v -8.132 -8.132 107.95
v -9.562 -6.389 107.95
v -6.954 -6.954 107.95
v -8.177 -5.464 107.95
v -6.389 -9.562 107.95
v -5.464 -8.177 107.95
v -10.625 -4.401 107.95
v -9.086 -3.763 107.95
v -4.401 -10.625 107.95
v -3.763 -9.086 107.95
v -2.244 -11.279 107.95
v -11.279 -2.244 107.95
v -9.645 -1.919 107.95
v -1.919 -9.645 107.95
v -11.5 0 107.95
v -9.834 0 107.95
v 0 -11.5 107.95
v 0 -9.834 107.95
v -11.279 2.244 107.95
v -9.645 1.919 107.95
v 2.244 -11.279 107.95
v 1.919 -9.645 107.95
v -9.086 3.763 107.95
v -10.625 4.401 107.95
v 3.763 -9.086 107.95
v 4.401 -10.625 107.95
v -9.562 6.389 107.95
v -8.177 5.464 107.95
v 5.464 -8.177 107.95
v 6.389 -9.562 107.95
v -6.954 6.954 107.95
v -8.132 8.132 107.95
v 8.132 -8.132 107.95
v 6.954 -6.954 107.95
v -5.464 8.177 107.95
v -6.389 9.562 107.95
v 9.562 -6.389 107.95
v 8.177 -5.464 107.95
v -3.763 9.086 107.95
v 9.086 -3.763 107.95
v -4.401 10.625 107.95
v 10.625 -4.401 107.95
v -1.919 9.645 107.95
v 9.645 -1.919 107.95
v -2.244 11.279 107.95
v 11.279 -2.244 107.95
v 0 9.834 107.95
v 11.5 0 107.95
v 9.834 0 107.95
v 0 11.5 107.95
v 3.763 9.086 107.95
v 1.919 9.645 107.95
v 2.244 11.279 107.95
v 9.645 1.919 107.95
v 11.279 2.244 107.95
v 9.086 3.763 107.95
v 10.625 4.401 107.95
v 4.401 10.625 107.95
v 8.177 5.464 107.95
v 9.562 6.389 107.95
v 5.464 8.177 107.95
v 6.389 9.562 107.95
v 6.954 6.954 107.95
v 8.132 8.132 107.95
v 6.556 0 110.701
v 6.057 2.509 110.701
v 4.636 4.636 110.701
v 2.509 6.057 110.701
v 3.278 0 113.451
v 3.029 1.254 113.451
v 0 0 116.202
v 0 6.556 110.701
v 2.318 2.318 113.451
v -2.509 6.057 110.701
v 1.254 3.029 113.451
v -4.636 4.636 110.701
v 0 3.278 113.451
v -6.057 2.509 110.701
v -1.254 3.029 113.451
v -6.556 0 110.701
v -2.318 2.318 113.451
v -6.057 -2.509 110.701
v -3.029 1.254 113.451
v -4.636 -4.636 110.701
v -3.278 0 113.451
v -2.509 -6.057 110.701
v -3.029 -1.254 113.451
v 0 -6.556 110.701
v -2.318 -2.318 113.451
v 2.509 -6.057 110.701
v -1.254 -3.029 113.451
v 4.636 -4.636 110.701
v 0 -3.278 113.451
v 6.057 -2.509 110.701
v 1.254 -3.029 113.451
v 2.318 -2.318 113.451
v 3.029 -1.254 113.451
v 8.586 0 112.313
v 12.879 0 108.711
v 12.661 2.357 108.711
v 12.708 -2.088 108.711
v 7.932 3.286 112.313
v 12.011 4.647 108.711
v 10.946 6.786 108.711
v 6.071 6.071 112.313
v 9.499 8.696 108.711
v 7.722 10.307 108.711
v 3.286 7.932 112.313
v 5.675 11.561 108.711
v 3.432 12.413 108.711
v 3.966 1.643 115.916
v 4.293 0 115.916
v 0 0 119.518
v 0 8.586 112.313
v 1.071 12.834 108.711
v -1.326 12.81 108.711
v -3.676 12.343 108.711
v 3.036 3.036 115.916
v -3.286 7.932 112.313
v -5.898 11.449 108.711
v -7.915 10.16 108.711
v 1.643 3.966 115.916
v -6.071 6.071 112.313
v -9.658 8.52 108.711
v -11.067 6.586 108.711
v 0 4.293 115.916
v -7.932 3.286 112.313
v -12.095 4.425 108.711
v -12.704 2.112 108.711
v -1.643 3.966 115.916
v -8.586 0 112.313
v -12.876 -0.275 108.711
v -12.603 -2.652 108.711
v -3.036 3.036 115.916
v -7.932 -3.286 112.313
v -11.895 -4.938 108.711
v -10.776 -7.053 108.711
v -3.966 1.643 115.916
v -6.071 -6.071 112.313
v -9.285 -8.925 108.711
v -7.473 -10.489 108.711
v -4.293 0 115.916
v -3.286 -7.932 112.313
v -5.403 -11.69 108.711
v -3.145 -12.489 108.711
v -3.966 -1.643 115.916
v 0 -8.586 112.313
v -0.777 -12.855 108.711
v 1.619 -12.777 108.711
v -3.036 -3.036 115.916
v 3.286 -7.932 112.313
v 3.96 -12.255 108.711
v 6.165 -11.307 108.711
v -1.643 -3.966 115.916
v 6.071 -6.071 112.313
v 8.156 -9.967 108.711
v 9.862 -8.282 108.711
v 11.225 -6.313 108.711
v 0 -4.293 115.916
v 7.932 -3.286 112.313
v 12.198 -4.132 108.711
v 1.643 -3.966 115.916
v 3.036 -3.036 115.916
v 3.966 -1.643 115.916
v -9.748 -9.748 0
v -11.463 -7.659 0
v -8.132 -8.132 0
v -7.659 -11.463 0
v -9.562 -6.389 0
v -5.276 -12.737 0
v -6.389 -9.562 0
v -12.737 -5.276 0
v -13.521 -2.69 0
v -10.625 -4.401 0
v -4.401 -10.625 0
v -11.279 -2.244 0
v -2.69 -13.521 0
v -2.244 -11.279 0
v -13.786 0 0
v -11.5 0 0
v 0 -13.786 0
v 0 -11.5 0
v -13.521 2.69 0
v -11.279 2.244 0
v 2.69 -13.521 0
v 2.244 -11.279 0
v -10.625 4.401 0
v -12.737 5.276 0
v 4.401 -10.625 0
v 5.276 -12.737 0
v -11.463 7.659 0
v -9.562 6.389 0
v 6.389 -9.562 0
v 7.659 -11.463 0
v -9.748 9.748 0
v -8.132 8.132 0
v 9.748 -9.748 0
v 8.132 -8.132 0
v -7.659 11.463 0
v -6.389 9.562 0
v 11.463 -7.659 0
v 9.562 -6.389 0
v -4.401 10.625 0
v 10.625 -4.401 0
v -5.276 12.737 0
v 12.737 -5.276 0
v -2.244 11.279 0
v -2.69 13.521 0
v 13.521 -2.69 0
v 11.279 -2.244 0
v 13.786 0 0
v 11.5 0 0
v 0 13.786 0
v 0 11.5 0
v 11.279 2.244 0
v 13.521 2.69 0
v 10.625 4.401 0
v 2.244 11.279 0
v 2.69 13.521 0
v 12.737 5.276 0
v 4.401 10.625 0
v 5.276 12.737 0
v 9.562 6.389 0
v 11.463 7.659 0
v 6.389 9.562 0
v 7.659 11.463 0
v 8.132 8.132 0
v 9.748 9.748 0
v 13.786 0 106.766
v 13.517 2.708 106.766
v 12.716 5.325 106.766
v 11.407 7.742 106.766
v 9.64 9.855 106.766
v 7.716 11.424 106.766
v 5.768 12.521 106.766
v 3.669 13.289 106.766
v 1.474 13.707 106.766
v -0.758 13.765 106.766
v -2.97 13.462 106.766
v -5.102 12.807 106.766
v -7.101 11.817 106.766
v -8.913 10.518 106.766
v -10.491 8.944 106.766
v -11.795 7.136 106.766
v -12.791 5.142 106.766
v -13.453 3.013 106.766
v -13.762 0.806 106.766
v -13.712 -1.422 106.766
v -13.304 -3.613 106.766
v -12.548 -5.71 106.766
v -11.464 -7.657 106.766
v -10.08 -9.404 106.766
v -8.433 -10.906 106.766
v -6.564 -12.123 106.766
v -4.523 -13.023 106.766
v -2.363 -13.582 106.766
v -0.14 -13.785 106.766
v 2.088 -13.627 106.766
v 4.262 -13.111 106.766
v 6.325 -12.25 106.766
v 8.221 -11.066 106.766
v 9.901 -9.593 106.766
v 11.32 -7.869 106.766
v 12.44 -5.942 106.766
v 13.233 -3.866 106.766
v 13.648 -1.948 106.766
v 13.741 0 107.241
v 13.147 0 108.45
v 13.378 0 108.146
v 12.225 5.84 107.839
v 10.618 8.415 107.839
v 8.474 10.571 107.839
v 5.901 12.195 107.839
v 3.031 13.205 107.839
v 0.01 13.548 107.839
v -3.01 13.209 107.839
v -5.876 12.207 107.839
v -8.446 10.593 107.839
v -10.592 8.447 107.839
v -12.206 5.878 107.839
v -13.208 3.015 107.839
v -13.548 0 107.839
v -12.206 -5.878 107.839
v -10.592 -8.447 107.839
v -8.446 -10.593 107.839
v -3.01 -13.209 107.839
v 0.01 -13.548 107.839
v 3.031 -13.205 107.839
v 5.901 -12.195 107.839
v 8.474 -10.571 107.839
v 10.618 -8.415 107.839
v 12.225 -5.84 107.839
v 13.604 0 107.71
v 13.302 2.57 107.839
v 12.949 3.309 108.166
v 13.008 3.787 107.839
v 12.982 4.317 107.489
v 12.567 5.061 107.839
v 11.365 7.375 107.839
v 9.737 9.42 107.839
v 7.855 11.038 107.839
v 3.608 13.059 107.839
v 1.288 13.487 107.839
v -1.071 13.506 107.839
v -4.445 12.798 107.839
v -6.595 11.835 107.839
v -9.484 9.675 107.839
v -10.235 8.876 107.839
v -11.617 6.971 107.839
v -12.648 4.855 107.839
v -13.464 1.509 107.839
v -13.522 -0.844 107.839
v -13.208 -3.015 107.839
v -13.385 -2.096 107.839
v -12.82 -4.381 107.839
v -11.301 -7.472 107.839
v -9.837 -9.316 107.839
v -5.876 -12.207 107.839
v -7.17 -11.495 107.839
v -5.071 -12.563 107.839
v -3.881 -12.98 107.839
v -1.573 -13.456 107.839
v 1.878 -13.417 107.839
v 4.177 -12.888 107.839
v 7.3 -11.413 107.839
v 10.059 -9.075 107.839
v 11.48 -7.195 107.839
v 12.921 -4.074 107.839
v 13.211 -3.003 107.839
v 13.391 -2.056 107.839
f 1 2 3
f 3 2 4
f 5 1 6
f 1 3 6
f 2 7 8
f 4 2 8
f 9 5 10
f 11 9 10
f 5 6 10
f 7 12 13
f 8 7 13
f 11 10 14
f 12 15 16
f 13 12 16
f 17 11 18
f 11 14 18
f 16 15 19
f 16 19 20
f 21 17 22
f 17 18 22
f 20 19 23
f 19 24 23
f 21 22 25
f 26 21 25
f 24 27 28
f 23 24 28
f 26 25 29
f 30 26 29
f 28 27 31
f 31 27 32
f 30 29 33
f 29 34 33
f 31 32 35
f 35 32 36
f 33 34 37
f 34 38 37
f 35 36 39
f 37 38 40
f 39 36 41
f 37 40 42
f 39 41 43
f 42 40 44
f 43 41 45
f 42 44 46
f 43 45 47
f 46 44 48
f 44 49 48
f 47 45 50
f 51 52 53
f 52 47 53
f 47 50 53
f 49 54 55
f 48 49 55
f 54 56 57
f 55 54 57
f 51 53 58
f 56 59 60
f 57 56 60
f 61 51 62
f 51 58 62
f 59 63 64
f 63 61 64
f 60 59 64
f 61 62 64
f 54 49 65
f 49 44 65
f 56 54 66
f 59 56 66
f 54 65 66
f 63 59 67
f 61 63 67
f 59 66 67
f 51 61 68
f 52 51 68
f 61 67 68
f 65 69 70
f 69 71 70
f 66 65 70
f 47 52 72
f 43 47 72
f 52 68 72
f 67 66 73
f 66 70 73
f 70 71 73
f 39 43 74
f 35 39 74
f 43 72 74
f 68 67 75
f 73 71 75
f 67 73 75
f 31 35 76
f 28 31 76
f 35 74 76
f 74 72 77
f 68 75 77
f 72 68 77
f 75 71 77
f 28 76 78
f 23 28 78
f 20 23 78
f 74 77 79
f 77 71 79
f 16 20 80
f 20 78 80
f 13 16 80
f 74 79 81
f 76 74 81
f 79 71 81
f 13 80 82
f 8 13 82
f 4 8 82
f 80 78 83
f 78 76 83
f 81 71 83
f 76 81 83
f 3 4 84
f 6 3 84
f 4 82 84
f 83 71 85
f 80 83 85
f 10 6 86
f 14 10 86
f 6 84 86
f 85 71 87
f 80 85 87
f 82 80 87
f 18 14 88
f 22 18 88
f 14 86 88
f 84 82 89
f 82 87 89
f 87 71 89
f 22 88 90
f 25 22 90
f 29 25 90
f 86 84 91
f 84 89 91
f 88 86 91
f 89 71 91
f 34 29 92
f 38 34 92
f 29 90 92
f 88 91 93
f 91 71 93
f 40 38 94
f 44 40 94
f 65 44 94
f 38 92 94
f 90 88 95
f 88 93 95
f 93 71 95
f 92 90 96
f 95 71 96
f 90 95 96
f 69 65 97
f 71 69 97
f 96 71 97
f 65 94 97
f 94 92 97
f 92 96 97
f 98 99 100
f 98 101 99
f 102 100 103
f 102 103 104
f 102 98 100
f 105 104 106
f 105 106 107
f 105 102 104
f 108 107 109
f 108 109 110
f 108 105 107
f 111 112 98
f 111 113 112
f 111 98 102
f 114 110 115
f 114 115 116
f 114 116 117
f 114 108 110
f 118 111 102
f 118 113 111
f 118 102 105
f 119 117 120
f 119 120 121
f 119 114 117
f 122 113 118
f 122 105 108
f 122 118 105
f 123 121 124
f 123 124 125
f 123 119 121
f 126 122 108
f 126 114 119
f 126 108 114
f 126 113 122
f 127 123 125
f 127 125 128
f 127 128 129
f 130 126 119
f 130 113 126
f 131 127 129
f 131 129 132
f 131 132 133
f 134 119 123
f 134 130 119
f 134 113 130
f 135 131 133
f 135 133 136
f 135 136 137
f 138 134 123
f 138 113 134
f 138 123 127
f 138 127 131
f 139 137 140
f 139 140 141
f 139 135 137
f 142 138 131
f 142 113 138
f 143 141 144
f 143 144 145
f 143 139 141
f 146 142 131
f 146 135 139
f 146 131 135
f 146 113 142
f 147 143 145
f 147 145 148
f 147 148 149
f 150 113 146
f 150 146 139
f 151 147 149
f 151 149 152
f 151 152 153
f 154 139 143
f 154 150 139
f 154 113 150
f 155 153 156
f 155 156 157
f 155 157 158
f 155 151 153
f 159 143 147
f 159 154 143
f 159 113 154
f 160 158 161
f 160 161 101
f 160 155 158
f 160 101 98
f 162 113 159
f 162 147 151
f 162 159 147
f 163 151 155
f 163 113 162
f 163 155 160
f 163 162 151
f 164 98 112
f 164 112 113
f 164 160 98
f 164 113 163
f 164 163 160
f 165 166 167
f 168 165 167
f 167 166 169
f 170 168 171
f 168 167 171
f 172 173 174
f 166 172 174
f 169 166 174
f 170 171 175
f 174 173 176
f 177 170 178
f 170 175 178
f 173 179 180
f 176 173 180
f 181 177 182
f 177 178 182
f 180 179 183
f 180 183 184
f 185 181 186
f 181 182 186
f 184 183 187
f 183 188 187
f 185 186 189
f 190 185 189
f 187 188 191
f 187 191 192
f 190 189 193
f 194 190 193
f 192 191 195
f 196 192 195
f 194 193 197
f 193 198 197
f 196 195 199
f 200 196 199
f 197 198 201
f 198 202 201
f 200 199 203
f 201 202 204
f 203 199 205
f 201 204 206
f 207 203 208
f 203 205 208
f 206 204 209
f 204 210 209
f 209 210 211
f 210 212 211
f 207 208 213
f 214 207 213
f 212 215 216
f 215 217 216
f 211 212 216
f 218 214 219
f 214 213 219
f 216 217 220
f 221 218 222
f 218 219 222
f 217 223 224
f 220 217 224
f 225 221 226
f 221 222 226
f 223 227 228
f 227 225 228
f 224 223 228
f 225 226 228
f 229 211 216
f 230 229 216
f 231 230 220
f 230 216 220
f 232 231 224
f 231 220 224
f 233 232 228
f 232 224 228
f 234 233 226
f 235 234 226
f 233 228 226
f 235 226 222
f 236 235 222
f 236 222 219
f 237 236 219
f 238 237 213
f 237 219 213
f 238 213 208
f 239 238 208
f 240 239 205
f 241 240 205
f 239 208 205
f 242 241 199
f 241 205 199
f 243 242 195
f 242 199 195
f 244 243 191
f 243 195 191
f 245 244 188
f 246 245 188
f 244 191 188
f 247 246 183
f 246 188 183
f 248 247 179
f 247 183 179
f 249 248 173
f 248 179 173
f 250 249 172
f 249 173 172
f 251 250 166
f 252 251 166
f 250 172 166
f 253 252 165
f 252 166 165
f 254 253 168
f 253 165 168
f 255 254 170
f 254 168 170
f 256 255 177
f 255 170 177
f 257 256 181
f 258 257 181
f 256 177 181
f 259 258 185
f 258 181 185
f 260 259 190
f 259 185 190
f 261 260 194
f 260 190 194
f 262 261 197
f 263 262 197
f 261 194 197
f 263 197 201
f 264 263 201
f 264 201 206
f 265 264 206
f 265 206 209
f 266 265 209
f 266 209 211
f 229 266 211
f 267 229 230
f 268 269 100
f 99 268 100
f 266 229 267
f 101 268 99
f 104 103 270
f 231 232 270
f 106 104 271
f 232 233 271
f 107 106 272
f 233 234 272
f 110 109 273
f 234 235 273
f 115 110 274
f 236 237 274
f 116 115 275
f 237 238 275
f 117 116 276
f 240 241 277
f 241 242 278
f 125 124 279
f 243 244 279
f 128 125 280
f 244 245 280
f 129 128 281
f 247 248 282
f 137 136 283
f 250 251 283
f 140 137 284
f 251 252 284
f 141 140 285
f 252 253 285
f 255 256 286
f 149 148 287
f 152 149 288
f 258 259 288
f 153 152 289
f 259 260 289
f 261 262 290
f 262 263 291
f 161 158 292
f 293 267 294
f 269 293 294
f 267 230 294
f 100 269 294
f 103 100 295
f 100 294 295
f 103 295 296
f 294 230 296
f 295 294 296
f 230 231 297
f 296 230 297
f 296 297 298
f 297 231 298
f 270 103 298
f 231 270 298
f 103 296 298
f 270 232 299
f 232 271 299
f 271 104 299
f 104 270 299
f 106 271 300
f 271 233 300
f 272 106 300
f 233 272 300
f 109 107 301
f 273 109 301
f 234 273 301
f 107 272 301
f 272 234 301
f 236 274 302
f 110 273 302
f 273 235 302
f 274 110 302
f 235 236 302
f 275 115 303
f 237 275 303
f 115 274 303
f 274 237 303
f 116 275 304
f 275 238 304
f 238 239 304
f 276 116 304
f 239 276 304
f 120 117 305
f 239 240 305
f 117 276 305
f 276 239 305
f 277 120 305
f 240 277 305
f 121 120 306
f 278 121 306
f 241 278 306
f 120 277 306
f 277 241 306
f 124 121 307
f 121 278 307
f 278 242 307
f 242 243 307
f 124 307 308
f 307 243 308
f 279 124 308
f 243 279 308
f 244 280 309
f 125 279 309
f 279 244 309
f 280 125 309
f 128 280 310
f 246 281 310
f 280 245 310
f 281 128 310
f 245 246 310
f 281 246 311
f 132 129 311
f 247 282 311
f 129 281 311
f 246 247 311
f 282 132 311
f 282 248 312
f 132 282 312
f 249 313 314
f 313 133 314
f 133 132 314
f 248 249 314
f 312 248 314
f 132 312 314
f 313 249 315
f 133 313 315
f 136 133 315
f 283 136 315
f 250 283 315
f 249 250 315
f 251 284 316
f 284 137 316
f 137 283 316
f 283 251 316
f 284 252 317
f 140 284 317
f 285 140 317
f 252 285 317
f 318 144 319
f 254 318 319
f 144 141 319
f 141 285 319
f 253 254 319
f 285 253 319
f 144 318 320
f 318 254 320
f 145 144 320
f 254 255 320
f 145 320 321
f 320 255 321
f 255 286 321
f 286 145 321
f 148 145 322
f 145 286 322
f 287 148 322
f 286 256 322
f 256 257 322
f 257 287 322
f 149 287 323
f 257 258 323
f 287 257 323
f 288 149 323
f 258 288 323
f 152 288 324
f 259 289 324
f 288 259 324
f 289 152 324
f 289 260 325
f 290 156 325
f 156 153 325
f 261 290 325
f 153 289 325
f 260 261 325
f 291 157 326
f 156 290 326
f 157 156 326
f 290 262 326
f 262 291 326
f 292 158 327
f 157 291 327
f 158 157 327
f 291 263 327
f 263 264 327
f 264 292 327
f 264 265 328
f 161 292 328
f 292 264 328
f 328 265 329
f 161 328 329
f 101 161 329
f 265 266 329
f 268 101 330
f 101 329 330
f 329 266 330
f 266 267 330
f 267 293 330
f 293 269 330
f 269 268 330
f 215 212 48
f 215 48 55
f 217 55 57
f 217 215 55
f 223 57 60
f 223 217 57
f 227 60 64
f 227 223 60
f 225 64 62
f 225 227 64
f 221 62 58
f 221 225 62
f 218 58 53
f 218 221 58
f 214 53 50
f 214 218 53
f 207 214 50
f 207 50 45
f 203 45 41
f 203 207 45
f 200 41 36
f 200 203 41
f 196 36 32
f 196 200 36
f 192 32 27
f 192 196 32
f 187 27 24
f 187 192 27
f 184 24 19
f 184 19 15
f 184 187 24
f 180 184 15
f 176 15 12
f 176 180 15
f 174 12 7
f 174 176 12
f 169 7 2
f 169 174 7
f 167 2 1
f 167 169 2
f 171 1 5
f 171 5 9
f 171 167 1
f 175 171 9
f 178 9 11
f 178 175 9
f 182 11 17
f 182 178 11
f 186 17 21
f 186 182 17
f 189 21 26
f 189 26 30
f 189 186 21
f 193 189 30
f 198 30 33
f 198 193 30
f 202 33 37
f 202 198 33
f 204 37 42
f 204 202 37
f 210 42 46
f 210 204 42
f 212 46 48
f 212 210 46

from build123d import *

# Parameters (mm, degrees)
F0_R     = 13.786
F0_R_2   = 11.5
F1_DEPTH = 107.95
F2_R     = 13.786
F2_R_2   = 11.5
F3_DEPTH = 31.75
F3_TAPER = 50
F4_T     = 2.54
F5_COUNT = 4
F6_R     = 2.54
F6_2_R   = 2.54
F6_3_R   = 2.54
F6_4_R   = 2.54


# Not quite as in the source:
# - a shell that OpenCascade refuses in one call is made with other operations: the cavity is built on its own and cut out
# - a feature names something its author has since deleted; it is built from what else it names


with BuildPart() as f1:
    # F0 (on Top) → F1 (new body)
    with BuildSketch(Plane.XY):
        Circle(F0_R)
        Circle(F0_R_2, mode=Mode.SUBTRACT)
    extrude(amount=F1_DEPTH)

    # F2 (on face) → F3 (join)
    with BuildSketch(Plane.XY.offset(107.95)):
        Circle(F2_R)
        Circle(F2_R_2, mode=Mode.SUBTRACT)
        Circle(F2_R_2)
    extrude(amount=F3_DEPTH, taper=F3_TAPER)

    # F4: shell of thickness 2.54, made by hand


with BuildPart() as f4_core1:
    # F4_t2: copy of F1
    add(f1.part)

    # the walls: a layer under each face that stays
    f4_faces = [f4_core1.faces().sort_by_distance(p)[0] for p in [
        (-13.786, 0, 53.975),
        (-9.1906666667, -9.1906666667, 0),
        (-6.893, 0, 113.7339137577),
        (-11.5, 0, 53.975),
    ]]
    thicken(f4_faces, amount=-F4_T, mode=Mode.SUBTRACT)


with BuildPart() as f1_1:
    add(f1.part)

    # what is left inside the walls is the cavity
    f4_cavity = [f4_core1.part.solids().sort_by_distance(p)[0] for p in [
        (-6.539981, 0, 110.68124),
    ]]
    add(f4_cavity, mode=Mode.SUBTRACT)


with BuildPart() as f5_1:
    # F5: instance of F1
    add(f1_1.part.rotate(Axis((0, 0, 0), (0, 0, 1)), 1 * 360 / F5_COUNT))

    # F6#2
    f6_2_edges = [f5_1.edges().sort_by_distance(p)[0] for p in [
        (0, -13.786, 107.95),
    ]]
    fillet(f6_2_edges, radius=F6_2_R)


with BuildPart() as f5_2:
    # F5: instance of F1
    add(f1_1.part.rotate(Axis((0, 0, 0), (0, 0, 1)), 2 * 360 / F5_COUNT))

    # F6#3
    f6_3_edges = [f5_2.edges().sort_by_distance(p)[0] for p in [
        (13.786, 0, 107.95),
    ]]
    fillet(f6_3_edges, radius=F6_3_R)


with BuildPart() as f5_3:
    # F5: instance of F1
    add(f1_1.part.rotate(Axis((0, 0, 0), (0, 0, 1)), 3 * 360 / F5_COUNT))

    # F6#4
    f6_4_edges = [f5_3.edges().sort_by_distance(p)[0] for p in [
        (0, 13.786, 107.95),
    ]]
    fillet(f6_4_edges, radius=F6_4_R)


with BuildPart() as f1_2:
    add(f1_1.part)

    # F6
    f6_edges = [f1_2.edges().sort_by_distance(p)[0] for p in [
        (-13.786, 0, 107.95),
        (6.893, 0, 113.733914),
    ]]
    fillet(f6_edges, radius=F6_R)


solid = f1_2.part
